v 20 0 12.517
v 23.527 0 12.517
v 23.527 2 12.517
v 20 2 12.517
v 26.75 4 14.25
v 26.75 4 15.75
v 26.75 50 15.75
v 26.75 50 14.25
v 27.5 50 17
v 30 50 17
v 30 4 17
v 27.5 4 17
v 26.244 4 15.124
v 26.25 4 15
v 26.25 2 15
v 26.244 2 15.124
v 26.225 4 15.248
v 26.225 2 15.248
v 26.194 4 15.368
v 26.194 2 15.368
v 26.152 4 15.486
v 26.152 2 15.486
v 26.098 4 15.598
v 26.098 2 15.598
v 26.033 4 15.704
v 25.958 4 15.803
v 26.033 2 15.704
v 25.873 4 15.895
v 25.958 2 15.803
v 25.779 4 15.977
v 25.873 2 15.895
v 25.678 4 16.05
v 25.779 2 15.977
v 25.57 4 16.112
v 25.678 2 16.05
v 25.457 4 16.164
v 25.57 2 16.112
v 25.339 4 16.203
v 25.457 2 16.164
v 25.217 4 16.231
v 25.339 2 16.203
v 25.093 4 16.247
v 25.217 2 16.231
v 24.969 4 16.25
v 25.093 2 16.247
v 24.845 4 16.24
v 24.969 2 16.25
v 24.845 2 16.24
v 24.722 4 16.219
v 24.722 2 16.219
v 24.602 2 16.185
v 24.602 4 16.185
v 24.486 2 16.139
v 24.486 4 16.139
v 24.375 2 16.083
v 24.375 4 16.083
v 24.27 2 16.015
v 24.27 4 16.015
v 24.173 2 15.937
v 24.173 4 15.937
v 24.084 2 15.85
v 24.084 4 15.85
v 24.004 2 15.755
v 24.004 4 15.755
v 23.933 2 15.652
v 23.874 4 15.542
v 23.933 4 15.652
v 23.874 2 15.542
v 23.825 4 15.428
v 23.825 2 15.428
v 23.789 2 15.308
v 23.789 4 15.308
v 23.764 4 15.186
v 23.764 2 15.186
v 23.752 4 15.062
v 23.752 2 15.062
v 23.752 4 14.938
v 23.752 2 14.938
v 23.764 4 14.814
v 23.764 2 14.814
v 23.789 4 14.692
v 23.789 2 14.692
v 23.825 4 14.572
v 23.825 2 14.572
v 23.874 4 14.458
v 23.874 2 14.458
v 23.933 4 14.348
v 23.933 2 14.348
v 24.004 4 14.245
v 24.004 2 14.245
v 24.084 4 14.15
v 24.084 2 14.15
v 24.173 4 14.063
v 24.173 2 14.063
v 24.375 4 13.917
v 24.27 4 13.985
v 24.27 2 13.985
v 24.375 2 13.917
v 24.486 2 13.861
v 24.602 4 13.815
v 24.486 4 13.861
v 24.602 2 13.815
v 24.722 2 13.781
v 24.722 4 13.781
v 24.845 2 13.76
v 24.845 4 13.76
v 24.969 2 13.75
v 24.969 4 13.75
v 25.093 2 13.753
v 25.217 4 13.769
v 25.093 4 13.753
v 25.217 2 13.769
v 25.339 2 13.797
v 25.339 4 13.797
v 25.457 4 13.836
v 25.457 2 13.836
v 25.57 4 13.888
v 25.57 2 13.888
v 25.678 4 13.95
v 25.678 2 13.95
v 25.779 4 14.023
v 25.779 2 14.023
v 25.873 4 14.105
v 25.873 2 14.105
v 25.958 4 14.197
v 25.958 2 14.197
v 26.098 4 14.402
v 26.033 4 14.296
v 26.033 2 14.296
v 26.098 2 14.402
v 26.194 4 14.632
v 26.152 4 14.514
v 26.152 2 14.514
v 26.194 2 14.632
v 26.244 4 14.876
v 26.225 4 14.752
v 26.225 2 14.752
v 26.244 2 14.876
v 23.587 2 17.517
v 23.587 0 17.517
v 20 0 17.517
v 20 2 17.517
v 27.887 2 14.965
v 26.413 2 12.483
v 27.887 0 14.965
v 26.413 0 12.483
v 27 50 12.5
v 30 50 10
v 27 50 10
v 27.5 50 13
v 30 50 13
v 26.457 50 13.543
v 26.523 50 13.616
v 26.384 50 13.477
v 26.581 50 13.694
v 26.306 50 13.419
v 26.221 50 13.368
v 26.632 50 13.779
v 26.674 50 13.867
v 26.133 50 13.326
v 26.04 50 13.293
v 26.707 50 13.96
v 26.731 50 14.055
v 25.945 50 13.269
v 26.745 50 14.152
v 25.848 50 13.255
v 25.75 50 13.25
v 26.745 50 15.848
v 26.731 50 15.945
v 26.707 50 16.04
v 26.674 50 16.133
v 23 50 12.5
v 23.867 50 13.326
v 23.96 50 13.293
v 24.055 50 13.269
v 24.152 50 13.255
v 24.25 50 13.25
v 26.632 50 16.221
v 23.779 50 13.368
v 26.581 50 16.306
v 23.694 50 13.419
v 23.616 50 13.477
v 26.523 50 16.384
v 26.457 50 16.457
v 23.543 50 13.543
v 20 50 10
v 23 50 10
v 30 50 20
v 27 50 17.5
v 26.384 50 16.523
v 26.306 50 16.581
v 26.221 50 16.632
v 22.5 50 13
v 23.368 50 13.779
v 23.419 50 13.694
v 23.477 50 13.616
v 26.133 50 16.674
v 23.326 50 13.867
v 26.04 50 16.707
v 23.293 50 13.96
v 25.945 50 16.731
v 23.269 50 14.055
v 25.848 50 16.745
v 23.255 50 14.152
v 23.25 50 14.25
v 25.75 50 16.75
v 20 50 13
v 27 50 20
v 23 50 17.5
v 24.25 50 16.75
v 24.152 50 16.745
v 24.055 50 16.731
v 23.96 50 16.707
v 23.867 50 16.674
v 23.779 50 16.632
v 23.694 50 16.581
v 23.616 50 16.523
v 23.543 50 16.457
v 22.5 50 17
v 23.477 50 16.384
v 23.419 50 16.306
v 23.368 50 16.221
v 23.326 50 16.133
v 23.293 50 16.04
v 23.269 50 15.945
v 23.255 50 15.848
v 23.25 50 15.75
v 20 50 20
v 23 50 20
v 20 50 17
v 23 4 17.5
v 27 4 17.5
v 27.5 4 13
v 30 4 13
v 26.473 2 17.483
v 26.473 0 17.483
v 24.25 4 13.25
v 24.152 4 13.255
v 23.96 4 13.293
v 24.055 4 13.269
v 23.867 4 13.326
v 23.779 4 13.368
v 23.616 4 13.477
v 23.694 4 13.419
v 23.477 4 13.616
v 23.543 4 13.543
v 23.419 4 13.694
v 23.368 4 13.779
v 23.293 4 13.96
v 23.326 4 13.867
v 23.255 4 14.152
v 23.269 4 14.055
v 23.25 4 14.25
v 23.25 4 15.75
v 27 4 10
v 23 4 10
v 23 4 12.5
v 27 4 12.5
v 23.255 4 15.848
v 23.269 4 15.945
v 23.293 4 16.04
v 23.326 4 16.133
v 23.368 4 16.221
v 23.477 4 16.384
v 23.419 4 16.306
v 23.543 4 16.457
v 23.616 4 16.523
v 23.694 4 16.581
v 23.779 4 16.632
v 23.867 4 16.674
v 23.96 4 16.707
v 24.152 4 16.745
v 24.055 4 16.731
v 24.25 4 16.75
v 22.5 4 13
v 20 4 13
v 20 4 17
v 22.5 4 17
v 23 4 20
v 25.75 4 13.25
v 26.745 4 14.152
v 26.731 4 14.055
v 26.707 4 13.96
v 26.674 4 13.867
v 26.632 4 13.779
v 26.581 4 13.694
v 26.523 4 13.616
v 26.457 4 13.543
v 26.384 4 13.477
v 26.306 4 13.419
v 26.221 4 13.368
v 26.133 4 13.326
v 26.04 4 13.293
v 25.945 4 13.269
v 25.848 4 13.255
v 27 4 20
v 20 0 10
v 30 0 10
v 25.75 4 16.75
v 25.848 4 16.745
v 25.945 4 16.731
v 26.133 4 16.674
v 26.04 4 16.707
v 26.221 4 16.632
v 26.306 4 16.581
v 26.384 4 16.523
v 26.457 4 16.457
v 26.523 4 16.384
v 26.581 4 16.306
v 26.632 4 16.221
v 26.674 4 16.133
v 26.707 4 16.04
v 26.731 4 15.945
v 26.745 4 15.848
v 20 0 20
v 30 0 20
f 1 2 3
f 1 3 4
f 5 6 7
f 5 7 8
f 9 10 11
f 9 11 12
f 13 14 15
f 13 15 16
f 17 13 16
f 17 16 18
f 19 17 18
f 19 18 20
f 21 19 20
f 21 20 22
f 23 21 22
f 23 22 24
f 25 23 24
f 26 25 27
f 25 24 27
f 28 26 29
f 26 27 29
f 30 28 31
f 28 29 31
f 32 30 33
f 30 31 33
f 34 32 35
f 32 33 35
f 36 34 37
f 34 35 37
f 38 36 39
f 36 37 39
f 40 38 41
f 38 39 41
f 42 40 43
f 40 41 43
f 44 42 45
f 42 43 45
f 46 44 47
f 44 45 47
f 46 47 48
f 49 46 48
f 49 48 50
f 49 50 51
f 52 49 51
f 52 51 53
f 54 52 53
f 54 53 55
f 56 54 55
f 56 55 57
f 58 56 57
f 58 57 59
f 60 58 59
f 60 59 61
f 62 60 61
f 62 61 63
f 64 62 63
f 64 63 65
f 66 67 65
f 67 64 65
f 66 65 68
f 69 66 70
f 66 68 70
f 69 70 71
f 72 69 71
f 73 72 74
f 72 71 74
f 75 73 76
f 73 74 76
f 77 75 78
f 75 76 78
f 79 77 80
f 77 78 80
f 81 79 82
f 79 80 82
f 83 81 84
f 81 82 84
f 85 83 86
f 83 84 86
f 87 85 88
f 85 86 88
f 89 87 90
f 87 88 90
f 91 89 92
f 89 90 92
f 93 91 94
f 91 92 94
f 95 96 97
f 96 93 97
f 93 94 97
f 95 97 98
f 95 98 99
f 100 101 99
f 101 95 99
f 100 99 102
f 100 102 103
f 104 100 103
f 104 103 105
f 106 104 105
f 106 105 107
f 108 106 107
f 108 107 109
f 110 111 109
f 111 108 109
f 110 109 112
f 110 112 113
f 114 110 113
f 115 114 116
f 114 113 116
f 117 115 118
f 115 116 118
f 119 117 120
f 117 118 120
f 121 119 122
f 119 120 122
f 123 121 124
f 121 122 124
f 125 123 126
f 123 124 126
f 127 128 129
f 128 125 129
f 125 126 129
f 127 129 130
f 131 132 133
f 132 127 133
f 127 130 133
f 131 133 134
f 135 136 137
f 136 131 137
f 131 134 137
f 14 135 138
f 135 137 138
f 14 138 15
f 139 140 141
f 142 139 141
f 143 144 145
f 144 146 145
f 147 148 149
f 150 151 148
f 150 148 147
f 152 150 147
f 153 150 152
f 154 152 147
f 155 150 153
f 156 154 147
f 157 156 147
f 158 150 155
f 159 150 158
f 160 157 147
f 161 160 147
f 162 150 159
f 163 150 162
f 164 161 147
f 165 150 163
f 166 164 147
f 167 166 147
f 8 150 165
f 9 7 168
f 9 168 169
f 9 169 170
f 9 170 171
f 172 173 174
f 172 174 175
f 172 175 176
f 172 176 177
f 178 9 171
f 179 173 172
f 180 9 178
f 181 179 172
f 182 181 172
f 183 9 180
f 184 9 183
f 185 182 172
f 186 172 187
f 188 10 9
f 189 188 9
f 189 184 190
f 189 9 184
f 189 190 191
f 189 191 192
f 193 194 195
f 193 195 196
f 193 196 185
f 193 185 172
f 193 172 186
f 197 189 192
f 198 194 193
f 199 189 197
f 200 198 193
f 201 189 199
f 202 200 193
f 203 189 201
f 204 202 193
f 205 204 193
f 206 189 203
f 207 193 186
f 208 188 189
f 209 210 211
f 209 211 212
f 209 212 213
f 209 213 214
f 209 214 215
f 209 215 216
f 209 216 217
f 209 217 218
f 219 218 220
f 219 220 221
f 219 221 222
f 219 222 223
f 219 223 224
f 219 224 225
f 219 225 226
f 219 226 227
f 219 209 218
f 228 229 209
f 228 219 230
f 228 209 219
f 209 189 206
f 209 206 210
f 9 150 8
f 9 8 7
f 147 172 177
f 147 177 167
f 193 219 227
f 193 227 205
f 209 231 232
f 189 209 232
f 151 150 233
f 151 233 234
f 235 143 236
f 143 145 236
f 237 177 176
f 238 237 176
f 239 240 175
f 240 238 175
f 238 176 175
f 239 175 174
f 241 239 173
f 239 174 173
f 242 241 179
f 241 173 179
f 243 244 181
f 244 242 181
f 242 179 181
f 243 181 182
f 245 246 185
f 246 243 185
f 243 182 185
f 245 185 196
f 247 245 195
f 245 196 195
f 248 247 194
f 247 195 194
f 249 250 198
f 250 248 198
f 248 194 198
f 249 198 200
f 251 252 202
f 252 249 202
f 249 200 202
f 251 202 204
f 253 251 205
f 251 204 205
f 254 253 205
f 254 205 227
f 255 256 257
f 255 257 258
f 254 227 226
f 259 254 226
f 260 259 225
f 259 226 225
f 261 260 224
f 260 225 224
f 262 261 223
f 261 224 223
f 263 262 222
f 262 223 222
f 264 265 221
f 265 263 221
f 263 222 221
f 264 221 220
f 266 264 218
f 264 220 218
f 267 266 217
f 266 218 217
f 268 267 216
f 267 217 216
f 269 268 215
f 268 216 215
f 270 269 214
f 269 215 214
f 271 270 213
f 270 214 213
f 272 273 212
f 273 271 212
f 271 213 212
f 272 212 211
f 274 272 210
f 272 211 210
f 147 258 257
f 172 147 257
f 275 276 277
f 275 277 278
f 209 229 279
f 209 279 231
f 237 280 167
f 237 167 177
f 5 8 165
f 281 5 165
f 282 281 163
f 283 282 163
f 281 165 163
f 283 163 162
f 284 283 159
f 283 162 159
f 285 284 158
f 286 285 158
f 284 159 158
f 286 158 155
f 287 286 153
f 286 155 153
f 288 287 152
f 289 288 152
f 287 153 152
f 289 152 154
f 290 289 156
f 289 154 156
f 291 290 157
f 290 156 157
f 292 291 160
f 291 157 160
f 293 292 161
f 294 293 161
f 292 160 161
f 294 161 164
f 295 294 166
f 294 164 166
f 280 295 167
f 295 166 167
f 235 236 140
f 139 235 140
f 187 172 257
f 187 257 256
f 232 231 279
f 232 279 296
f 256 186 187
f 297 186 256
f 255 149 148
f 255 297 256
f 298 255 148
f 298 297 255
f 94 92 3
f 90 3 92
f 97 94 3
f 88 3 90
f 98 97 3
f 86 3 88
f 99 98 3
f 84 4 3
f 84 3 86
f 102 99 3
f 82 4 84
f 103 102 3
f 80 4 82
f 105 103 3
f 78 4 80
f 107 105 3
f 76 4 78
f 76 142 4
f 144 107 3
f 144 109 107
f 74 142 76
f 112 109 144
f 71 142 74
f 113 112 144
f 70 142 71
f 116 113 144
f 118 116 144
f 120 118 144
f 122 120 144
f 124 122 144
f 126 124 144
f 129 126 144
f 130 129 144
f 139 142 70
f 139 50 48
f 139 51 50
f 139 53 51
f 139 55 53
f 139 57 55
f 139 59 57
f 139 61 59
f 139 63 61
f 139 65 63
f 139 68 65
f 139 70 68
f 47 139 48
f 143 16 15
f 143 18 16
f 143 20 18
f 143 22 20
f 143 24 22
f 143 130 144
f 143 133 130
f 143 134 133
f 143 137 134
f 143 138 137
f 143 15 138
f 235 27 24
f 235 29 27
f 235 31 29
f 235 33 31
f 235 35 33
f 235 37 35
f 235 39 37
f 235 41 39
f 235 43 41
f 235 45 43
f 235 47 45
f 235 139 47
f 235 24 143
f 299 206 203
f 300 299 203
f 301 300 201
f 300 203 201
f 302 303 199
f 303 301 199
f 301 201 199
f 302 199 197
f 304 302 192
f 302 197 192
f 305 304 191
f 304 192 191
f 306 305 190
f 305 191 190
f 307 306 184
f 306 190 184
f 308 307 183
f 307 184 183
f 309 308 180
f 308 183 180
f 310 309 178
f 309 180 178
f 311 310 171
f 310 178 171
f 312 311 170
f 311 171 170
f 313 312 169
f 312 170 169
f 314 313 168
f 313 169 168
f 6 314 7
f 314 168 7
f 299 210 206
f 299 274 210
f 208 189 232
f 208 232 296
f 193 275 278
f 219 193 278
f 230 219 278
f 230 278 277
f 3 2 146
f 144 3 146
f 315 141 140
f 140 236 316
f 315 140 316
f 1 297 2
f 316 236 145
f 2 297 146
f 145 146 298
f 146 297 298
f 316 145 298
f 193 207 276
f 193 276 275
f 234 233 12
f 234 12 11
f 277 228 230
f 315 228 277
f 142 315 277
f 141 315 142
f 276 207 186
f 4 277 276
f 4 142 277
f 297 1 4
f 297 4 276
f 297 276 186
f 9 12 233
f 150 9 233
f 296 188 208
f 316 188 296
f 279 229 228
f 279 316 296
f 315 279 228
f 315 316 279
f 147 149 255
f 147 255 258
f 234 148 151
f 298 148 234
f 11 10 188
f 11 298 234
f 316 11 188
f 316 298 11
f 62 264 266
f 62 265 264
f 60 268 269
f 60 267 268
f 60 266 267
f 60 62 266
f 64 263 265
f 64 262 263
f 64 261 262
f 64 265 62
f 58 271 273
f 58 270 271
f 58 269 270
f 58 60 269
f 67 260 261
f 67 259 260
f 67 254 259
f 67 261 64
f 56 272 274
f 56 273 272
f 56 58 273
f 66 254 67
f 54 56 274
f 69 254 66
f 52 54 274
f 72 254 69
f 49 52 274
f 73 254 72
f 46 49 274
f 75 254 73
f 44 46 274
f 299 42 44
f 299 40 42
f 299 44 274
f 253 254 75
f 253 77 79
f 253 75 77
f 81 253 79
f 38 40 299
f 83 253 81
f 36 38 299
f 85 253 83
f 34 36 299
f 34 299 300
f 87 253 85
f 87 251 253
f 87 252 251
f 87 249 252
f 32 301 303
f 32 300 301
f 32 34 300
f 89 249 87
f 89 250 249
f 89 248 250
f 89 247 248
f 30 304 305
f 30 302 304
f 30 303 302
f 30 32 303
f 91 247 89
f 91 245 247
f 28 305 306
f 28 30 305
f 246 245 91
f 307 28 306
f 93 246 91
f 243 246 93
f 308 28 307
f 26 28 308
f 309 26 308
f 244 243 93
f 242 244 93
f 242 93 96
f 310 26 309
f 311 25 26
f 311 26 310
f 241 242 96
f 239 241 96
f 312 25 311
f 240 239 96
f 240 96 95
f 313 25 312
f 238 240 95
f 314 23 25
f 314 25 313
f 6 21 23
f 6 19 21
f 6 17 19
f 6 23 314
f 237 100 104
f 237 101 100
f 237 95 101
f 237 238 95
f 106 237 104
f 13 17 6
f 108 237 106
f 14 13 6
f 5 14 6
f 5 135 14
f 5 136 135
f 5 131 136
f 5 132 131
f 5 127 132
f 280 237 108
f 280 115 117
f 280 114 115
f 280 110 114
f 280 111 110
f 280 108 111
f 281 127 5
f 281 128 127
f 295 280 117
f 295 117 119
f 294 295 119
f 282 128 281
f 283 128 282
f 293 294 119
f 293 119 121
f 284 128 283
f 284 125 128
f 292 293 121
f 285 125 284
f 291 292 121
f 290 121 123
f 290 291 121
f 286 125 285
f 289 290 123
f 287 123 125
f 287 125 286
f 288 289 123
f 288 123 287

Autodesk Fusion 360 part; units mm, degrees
sketch "Esquisse1" plane through (0, 0, 0) normal (0, 1, 0) x (1, 0, 0)
  line L0 (30, -20) -> (20, -20)
  line L1 (20, -20) -> (20, -10)
  line L2 (20, -10) -> (30, -10)
  line L3 (30, -10) -> (30, -20)
  circle A0 centre (25, -15) radius 1.25
  dimension "d1" = 10
  dimension "d2" = 10
  dimension "d22" = 2.5
extrude "Extrusion3" add sketch "Esquisse1" along normal blind 4
sketch "Esquisse3" plane through (0, 4, 0) normal (0, 1, 0) x (-1, 0, 0)
  circle A0 centre (-25, 15) radius 1.25
  line L0 (-30, 10) -> (-20, 10)
  line L1 (-20, 10) -> (-20, 20)
  line L2 (-20, 20) -> (-30, 20)
  line L3 (-30, 20) -> (-30, 10)
  line L4 (-30, 20) -> (-30, 17)
  line L5 (-30, 17) -> (-27.5, 17)
  line L6 (-27.5, 17) -> (-27.5, 15)
  line L7 (-27.5, 15) -> (-27, 15)
  line L8 (-25, 16.75) -> (-25, 17.5)
  line L9 (-25, 17.5) -> (-27, 17.5)
  line L10 (-27, 17.5) -> (-27, 20)
  line L11 (-27, 20) -> (-30, 20)
  line L12 (-30, 17) -> (-30, 20)
  line L13 (-26.75, 15) -> (-27.625, 15)
  line L14 (-25, 17.5) -> (-25, 17)
  line L15 (-25, 16.75) -> (-26.75, 16.75)
  line L16 (-26.75, 16.75) -> (-26.75, 15)
  line L17 (-27.5, 13) -> (-30, 13)
  line L18 (-30, 13) -> (-30, 10)
  line L19 (-30, 10) -> (-27, 10)
  line L20 (-27, 12.5) -> (-25, 12.5)
  line L21 (-25, 12.5) -> (-25, 13)
  line L22 (-27, 10) -> (-27, 12.5)
  line L23 (-25, 13.25) -> (-25, 12.375)
  line L24 (-26.75, 13.25) -> (-25, 13.25)
  line L25 (-26.75, 15) -> (-26.75, 13.25)
  line L26 (-26.75, 15) -> (-27.5, 15)
  line L27 (-27.5, 15) -> (-27.5, 13)
  line L28 (-23, 12.5) -> (-23, 10)
  line L29 (-23, 10) -> (-20, 10)
  line L30 (-20, 10) -> (-20, 13)
  line L31 (-22.5, 13) -> (-22.5, 15)
  line L32 (-22.5, 15) -> (-23, 15)
  line L33 (-20, 13) -> (-22.5, 13)
  line L34 (-23.25, 15) -> (-22.375, 15)
  line L35 (-23.25, 13.25) -> (-23.25, 15)
  line L36 (-25, 13.25) -> (-23.25, 13.25)
  line L37 (-25, 13.25) -> (-25, 12.5)
  line L38 (-25, 12.5) -> (-23, 12.5)
  line L39 (-22.5, 17) -> (-20, 17)
  line L40 (-20, 17) -> (-20, 20)
  line L41 (-20, 20) -> (-23, 20)
  line L42 (-23, 17.5) -> (-25, 17.5)
  line L43 (-25, 17.5) -> (-25, 17)
  line L44 (-23, 20) -> (-23, 17.5)
  line L45 (-25, 16.75) -> (-25, 17.625)
  line L46 (-23.25, 16.75) -> (-25, 16.75)
  line L47 (-23.25, 15) -> (-23.25, 16.75)
  line L48 (-23.25, 15) -> (-22.5, 15)
  line L49 (-22.5, 15) -> (-22.5, 17)
  dimension "d19" = 2.5
  dimension "d20" = 2.5
  dimension "d21" = 2.5
  dimension "d25" = 360
  dimension "d27" = 0.75
  dimension "d28" = 0.75
  dimension "d36" = 4
  dimension "d37" = 3
  dimension "d38" = 3
  dimension "d39" = 3.5
extrude "Extrusion6" add sketch "Esquisse3" along normal blind 46 contours L0 L3 L7 L13 L17 L18 L19 L20 L21 L22 L23 L24 L25 L26 L27 L37 | L0 L1 L21 L23 L28 L29 L30 L31 L32 L33 L34 L35 L36 L37 L38 L48 | L2 L3 L4 L5 L6 L7 L8 L9 L10 L11 L12 L13 L14 L15 L16 L26 L43 L45 | L1 L2 L8 L14 L32 L34 L39 L40 L41 L42 L43 L44 L45 L46 L47 L48 L49
fillet "Congé2" radius 1 4 edges at (23.25, 27, 13.25) (26.75, 27, 13.25) (26.75, 27, 16.75) (23.25, 27, 16.75)
sketch "Esquisse4" plane through (0, 0, 0) normal (0, -1, 0) x (1, 0, 0)
  circle A0 centre (25, 15) radius 1.25
  line L0 (20, 10) -> (30, 10)
  line L1 (30, 10) -> (30, 20)
  line L2 (30, 20) -> (20, 20)
  line L3 (20, 20) -> (20, 10)
  line L4 (23.5266, 12.5173) -> (26.4134, 12.4827)
  line L5 (26.4134, 12.4827) -> (27.8868, 14.9654)
  line L6 (27.8868, 14.9654) -> (26.4734, 17.4827)
  line L7 (26.4734, 17.4827) -> (23.5866, 17.5173)
  line L8 (23.5866, 17.5173) -> (20, 17.5173)
  line L9 (23.5266, 12.5173) -> (20, 12.5173)
  point P0 (25, 15)
extrude "Extrusion7" cut sketch "Esquisse4" against normal blind 2 contours L3 L4 L5 L6 L7 L8 L9
